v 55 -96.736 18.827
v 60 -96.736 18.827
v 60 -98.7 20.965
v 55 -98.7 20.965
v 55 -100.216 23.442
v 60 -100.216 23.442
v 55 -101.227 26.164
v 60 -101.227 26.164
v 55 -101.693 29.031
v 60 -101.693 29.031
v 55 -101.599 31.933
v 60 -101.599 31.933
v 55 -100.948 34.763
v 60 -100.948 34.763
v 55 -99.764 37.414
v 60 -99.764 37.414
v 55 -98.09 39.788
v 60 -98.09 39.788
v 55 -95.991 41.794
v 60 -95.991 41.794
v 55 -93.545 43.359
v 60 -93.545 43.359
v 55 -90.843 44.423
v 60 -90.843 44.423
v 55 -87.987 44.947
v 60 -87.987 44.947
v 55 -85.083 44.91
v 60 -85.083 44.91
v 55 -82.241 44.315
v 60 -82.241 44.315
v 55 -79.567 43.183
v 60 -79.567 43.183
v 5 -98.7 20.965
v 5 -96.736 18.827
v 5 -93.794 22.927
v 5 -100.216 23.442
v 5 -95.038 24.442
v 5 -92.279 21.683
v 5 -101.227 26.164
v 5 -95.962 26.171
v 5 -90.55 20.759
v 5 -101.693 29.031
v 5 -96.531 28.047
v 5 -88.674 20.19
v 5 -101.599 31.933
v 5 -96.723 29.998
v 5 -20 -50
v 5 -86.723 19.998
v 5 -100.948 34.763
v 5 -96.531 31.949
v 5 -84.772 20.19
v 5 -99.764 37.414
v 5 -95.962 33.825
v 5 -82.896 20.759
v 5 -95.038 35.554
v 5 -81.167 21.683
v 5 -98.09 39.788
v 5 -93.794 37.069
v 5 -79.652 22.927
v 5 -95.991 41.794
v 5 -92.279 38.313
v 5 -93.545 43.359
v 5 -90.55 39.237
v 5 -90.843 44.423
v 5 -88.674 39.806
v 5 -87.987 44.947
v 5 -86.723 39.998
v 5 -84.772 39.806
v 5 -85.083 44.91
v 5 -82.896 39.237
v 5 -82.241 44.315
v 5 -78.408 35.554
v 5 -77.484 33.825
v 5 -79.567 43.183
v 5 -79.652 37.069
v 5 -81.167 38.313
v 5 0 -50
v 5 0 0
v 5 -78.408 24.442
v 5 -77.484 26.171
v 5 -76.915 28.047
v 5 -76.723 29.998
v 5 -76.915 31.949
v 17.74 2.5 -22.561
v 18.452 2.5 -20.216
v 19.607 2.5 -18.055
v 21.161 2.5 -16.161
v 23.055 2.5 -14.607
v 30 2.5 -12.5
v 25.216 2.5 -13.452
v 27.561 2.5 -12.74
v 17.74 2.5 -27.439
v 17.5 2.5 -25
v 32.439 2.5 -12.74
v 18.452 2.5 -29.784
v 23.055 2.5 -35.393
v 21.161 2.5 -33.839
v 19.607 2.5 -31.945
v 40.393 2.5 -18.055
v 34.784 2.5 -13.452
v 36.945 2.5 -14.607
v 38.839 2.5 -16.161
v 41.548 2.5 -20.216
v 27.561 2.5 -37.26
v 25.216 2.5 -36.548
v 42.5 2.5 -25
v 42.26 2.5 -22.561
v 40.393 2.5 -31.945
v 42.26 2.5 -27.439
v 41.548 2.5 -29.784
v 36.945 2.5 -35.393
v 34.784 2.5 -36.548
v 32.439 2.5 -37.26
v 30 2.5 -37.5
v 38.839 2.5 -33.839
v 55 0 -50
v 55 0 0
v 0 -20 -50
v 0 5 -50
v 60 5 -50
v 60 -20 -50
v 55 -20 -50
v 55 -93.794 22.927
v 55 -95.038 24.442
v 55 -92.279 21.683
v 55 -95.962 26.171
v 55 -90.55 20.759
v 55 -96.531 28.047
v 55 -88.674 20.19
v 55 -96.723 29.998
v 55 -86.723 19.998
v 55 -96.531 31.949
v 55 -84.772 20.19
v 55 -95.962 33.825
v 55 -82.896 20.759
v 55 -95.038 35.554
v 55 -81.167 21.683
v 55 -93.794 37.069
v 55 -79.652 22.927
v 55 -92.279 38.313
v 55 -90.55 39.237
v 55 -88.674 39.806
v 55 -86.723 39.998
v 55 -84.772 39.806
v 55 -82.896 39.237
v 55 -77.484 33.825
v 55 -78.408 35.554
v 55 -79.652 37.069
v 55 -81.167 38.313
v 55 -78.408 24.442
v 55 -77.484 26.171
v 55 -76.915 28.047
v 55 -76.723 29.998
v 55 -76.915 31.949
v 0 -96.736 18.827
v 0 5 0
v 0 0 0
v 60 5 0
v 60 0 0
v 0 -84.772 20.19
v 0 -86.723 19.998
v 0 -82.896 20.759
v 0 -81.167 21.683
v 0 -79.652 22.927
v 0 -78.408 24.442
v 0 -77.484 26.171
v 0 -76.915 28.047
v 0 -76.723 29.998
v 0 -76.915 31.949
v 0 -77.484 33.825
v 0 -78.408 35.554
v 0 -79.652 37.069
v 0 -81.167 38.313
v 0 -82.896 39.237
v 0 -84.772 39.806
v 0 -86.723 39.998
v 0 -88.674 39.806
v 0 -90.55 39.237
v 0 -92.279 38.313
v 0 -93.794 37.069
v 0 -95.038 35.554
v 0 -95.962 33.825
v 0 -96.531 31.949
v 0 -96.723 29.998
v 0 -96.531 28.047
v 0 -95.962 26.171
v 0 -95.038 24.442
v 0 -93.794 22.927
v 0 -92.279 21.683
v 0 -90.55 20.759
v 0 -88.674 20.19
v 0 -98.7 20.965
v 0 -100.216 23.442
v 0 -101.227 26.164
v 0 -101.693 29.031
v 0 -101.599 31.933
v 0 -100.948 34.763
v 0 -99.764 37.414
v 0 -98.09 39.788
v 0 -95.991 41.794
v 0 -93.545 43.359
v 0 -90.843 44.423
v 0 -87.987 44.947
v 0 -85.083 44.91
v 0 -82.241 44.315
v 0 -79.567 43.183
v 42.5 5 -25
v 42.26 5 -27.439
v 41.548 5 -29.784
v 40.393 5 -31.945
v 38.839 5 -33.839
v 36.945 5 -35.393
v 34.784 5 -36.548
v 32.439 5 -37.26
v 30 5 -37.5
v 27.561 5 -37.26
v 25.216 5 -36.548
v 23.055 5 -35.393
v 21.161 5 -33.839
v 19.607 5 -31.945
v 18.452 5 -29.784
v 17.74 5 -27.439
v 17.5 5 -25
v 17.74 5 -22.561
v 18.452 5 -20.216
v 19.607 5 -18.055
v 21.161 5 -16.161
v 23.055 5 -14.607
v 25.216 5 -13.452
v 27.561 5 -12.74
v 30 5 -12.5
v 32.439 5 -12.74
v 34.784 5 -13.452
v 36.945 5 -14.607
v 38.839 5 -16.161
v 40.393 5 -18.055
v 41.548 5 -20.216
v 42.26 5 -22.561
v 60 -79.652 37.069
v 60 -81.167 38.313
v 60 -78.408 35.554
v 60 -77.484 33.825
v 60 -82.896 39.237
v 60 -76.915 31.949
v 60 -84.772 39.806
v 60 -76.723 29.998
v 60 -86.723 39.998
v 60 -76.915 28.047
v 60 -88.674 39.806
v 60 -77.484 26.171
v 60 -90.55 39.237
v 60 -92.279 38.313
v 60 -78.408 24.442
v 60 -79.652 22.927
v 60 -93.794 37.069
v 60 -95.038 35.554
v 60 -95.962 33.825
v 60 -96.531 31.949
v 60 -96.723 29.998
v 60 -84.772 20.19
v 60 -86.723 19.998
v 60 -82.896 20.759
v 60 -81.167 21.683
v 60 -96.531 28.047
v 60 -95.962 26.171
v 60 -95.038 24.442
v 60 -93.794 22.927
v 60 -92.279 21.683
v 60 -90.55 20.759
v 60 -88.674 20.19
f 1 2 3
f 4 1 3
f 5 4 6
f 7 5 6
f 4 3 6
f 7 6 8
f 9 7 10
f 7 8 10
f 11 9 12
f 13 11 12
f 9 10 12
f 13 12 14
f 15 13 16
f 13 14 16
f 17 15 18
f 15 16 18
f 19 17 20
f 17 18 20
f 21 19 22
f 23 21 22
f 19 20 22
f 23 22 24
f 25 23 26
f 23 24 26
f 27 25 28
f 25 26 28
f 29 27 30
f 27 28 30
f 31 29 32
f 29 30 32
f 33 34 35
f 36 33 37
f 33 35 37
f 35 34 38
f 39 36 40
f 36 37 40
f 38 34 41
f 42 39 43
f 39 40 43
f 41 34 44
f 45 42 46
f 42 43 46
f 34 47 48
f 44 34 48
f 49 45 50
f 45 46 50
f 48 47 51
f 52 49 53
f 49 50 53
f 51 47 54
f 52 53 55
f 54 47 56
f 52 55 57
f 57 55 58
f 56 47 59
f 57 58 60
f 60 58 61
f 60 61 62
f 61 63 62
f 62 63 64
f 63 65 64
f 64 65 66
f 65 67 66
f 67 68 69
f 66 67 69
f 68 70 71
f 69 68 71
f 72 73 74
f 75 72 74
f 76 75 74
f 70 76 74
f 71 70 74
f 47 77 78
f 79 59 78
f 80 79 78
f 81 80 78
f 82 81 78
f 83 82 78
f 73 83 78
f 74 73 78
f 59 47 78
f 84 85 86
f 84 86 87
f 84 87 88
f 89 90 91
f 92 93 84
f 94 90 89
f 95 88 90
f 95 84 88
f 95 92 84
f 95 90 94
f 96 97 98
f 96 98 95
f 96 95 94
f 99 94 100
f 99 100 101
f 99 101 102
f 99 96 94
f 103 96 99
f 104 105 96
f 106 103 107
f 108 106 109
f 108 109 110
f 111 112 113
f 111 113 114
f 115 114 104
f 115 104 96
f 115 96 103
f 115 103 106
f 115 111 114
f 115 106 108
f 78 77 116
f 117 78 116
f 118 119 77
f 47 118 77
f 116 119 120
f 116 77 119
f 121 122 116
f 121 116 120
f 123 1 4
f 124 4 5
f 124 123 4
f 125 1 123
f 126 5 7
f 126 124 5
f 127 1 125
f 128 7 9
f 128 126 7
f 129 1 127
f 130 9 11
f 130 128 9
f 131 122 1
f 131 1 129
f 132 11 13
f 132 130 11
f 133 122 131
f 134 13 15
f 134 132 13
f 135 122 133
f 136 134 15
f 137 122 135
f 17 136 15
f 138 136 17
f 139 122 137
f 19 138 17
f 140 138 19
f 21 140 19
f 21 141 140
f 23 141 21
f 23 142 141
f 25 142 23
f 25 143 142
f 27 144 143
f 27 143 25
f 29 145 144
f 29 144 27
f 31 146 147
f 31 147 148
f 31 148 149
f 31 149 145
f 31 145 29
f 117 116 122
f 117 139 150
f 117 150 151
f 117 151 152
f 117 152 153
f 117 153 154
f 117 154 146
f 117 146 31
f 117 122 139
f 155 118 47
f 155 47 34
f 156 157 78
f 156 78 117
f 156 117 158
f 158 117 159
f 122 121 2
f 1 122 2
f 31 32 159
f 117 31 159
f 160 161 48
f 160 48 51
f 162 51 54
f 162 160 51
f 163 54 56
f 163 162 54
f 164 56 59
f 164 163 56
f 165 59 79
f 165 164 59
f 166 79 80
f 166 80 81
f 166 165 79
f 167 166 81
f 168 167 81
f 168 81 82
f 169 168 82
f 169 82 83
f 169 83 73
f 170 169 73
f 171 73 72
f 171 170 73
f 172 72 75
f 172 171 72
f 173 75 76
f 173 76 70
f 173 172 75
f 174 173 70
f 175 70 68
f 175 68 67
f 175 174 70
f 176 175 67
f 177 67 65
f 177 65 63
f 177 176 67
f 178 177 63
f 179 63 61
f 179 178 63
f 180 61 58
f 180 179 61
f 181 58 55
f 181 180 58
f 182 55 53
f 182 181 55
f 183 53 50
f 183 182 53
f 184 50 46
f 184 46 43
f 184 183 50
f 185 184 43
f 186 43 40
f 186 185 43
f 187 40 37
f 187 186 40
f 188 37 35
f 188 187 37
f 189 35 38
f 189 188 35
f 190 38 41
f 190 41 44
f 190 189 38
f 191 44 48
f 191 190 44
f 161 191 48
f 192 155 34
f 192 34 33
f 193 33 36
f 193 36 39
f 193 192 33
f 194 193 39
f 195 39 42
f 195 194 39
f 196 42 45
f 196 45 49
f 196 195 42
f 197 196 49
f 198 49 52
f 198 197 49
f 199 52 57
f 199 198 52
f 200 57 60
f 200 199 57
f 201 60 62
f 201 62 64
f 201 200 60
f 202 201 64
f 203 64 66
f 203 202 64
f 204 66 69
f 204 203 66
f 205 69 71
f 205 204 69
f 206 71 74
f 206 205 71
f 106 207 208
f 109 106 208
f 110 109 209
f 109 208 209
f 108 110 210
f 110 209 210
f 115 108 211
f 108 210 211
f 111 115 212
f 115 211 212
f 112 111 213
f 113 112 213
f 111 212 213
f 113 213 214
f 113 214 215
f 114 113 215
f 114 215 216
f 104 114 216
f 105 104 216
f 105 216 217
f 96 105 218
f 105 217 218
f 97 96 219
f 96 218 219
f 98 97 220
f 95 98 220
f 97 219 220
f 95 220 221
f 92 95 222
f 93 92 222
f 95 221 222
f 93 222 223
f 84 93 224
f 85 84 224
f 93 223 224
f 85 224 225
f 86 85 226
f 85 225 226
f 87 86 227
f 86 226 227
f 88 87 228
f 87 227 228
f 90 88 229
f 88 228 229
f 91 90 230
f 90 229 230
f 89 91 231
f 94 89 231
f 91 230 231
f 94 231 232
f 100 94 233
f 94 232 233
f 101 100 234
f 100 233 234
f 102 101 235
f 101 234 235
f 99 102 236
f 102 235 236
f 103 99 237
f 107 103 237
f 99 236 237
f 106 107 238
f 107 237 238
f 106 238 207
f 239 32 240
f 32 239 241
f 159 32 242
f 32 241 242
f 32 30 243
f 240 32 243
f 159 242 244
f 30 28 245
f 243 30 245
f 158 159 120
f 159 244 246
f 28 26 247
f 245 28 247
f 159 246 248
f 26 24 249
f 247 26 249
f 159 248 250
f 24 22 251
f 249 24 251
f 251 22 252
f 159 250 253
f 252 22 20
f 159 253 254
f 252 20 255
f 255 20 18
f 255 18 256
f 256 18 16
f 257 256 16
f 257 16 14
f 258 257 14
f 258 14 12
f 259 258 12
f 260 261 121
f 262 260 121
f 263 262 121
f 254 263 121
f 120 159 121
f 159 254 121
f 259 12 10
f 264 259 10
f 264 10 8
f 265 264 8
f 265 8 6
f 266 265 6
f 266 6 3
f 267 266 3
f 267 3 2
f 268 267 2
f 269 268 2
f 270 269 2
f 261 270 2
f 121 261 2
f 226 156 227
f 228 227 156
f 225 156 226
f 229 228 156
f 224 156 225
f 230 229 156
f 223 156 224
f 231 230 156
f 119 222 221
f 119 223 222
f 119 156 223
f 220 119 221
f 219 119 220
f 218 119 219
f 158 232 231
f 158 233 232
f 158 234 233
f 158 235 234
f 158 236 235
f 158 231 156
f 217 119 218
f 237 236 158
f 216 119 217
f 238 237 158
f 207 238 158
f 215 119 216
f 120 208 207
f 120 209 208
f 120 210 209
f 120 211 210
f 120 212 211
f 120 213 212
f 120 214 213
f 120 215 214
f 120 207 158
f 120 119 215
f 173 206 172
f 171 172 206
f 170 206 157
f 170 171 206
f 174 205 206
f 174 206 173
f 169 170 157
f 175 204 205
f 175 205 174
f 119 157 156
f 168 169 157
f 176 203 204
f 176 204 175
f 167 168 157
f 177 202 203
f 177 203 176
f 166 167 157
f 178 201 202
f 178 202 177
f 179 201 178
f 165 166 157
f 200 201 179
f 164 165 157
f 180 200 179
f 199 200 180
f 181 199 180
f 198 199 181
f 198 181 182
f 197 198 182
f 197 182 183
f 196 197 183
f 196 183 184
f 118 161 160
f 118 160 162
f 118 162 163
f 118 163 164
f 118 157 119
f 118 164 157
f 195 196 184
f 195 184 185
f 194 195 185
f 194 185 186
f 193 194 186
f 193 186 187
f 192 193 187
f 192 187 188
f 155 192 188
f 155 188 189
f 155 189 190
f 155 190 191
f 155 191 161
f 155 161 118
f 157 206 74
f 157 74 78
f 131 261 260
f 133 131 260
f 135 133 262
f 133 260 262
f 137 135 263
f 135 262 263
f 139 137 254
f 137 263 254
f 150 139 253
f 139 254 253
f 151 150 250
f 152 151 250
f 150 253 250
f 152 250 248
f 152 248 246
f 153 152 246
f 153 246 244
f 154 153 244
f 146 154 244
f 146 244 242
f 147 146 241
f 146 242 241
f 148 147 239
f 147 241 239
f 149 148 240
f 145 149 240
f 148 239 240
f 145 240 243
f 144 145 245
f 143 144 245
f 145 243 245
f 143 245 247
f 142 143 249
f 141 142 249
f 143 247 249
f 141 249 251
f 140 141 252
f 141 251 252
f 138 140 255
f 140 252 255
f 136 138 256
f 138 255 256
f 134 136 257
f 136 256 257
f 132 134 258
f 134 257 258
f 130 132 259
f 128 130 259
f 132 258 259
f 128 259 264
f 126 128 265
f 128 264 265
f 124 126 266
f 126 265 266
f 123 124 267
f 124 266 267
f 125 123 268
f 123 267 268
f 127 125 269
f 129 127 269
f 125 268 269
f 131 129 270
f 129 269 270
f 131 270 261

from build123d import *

# Parameters (mm, degrees)
SKETCH1_R           = 10
BOSS_EXTRUDE3_DEPTH = 5
SKETCH3_W           = 60
SKETCH3_H           = 50
BOSS_EXTRUDE4_DEPTH = 5
SKETCH9_R           = 12.5
CUT_EXTRUDE3_DEPTH  = 2.5


with BuildPart() as part:
    # Sketch1 → Boss-Extrude3 (new body)
    with BuildSketch(Plane(origin=(0, 0, 0), x_dir=(0, 0, -1), z_dir=(1, 0, 0))):
        with BuildLine():
            Line((0, 0), (50, 0))
            Line((50, 0), (50, -20))
            Line((50, -20), (-18.826787969, -96.735647895))
            ThreePointArc((-18.826787969, -96.735647895), (-38.641397295, -98.984562701), (-43.183296189, -79.566851328))
            Line((-43.183296189, -79.566851328), (0, 0))
        make_face()
        with Locations((-29.998149885, -86.722822296)):
            Circle(SKETCH1_R, mode=Mode.SUBTRACT)
    extrude(amount=BOSS_EXTRUDE3_DEPTH)


with BuildPart() as body_2:
    # Mirror6: mirrored copy
    add(part.part.mirror(Plane(origin=(30, 0, 0), x_dir=(0, 0, 1), z_dir=(1, 0, 0))))


with BuildPart() as part_1:
    add(part.part)

    add(body_2.part)  # Boss-Extrude4 merges body 2
    # Sketch3 → Boss-Extrude4 (add)
    with BuildSketch(Plane(origin=(0, 0, 0), x_dir=(1, 0, 0), z_dir=(0, 1, 0))):
        with Locations((30, 25)):
            Rectangle(SKETCH3_W, SKETCH3_H)
    extrude(amount=BOSS_EXTRUDE4_DEPTH)

    # Sketch9 → Cut-Extrude3 (cut)
    with BuildSketch(Plane(origin=(0, 5, 0), x_dir=(1, 0, 0), z_dir=(0, 1, 0))):
        with Locations((30, 25)):
            Circle(SKETCH9_R)
    extrude(amount=-CUT_EXTRUDE3_DEPTH, mode=Mode.SUBTRACT)


solid = part_1.part
